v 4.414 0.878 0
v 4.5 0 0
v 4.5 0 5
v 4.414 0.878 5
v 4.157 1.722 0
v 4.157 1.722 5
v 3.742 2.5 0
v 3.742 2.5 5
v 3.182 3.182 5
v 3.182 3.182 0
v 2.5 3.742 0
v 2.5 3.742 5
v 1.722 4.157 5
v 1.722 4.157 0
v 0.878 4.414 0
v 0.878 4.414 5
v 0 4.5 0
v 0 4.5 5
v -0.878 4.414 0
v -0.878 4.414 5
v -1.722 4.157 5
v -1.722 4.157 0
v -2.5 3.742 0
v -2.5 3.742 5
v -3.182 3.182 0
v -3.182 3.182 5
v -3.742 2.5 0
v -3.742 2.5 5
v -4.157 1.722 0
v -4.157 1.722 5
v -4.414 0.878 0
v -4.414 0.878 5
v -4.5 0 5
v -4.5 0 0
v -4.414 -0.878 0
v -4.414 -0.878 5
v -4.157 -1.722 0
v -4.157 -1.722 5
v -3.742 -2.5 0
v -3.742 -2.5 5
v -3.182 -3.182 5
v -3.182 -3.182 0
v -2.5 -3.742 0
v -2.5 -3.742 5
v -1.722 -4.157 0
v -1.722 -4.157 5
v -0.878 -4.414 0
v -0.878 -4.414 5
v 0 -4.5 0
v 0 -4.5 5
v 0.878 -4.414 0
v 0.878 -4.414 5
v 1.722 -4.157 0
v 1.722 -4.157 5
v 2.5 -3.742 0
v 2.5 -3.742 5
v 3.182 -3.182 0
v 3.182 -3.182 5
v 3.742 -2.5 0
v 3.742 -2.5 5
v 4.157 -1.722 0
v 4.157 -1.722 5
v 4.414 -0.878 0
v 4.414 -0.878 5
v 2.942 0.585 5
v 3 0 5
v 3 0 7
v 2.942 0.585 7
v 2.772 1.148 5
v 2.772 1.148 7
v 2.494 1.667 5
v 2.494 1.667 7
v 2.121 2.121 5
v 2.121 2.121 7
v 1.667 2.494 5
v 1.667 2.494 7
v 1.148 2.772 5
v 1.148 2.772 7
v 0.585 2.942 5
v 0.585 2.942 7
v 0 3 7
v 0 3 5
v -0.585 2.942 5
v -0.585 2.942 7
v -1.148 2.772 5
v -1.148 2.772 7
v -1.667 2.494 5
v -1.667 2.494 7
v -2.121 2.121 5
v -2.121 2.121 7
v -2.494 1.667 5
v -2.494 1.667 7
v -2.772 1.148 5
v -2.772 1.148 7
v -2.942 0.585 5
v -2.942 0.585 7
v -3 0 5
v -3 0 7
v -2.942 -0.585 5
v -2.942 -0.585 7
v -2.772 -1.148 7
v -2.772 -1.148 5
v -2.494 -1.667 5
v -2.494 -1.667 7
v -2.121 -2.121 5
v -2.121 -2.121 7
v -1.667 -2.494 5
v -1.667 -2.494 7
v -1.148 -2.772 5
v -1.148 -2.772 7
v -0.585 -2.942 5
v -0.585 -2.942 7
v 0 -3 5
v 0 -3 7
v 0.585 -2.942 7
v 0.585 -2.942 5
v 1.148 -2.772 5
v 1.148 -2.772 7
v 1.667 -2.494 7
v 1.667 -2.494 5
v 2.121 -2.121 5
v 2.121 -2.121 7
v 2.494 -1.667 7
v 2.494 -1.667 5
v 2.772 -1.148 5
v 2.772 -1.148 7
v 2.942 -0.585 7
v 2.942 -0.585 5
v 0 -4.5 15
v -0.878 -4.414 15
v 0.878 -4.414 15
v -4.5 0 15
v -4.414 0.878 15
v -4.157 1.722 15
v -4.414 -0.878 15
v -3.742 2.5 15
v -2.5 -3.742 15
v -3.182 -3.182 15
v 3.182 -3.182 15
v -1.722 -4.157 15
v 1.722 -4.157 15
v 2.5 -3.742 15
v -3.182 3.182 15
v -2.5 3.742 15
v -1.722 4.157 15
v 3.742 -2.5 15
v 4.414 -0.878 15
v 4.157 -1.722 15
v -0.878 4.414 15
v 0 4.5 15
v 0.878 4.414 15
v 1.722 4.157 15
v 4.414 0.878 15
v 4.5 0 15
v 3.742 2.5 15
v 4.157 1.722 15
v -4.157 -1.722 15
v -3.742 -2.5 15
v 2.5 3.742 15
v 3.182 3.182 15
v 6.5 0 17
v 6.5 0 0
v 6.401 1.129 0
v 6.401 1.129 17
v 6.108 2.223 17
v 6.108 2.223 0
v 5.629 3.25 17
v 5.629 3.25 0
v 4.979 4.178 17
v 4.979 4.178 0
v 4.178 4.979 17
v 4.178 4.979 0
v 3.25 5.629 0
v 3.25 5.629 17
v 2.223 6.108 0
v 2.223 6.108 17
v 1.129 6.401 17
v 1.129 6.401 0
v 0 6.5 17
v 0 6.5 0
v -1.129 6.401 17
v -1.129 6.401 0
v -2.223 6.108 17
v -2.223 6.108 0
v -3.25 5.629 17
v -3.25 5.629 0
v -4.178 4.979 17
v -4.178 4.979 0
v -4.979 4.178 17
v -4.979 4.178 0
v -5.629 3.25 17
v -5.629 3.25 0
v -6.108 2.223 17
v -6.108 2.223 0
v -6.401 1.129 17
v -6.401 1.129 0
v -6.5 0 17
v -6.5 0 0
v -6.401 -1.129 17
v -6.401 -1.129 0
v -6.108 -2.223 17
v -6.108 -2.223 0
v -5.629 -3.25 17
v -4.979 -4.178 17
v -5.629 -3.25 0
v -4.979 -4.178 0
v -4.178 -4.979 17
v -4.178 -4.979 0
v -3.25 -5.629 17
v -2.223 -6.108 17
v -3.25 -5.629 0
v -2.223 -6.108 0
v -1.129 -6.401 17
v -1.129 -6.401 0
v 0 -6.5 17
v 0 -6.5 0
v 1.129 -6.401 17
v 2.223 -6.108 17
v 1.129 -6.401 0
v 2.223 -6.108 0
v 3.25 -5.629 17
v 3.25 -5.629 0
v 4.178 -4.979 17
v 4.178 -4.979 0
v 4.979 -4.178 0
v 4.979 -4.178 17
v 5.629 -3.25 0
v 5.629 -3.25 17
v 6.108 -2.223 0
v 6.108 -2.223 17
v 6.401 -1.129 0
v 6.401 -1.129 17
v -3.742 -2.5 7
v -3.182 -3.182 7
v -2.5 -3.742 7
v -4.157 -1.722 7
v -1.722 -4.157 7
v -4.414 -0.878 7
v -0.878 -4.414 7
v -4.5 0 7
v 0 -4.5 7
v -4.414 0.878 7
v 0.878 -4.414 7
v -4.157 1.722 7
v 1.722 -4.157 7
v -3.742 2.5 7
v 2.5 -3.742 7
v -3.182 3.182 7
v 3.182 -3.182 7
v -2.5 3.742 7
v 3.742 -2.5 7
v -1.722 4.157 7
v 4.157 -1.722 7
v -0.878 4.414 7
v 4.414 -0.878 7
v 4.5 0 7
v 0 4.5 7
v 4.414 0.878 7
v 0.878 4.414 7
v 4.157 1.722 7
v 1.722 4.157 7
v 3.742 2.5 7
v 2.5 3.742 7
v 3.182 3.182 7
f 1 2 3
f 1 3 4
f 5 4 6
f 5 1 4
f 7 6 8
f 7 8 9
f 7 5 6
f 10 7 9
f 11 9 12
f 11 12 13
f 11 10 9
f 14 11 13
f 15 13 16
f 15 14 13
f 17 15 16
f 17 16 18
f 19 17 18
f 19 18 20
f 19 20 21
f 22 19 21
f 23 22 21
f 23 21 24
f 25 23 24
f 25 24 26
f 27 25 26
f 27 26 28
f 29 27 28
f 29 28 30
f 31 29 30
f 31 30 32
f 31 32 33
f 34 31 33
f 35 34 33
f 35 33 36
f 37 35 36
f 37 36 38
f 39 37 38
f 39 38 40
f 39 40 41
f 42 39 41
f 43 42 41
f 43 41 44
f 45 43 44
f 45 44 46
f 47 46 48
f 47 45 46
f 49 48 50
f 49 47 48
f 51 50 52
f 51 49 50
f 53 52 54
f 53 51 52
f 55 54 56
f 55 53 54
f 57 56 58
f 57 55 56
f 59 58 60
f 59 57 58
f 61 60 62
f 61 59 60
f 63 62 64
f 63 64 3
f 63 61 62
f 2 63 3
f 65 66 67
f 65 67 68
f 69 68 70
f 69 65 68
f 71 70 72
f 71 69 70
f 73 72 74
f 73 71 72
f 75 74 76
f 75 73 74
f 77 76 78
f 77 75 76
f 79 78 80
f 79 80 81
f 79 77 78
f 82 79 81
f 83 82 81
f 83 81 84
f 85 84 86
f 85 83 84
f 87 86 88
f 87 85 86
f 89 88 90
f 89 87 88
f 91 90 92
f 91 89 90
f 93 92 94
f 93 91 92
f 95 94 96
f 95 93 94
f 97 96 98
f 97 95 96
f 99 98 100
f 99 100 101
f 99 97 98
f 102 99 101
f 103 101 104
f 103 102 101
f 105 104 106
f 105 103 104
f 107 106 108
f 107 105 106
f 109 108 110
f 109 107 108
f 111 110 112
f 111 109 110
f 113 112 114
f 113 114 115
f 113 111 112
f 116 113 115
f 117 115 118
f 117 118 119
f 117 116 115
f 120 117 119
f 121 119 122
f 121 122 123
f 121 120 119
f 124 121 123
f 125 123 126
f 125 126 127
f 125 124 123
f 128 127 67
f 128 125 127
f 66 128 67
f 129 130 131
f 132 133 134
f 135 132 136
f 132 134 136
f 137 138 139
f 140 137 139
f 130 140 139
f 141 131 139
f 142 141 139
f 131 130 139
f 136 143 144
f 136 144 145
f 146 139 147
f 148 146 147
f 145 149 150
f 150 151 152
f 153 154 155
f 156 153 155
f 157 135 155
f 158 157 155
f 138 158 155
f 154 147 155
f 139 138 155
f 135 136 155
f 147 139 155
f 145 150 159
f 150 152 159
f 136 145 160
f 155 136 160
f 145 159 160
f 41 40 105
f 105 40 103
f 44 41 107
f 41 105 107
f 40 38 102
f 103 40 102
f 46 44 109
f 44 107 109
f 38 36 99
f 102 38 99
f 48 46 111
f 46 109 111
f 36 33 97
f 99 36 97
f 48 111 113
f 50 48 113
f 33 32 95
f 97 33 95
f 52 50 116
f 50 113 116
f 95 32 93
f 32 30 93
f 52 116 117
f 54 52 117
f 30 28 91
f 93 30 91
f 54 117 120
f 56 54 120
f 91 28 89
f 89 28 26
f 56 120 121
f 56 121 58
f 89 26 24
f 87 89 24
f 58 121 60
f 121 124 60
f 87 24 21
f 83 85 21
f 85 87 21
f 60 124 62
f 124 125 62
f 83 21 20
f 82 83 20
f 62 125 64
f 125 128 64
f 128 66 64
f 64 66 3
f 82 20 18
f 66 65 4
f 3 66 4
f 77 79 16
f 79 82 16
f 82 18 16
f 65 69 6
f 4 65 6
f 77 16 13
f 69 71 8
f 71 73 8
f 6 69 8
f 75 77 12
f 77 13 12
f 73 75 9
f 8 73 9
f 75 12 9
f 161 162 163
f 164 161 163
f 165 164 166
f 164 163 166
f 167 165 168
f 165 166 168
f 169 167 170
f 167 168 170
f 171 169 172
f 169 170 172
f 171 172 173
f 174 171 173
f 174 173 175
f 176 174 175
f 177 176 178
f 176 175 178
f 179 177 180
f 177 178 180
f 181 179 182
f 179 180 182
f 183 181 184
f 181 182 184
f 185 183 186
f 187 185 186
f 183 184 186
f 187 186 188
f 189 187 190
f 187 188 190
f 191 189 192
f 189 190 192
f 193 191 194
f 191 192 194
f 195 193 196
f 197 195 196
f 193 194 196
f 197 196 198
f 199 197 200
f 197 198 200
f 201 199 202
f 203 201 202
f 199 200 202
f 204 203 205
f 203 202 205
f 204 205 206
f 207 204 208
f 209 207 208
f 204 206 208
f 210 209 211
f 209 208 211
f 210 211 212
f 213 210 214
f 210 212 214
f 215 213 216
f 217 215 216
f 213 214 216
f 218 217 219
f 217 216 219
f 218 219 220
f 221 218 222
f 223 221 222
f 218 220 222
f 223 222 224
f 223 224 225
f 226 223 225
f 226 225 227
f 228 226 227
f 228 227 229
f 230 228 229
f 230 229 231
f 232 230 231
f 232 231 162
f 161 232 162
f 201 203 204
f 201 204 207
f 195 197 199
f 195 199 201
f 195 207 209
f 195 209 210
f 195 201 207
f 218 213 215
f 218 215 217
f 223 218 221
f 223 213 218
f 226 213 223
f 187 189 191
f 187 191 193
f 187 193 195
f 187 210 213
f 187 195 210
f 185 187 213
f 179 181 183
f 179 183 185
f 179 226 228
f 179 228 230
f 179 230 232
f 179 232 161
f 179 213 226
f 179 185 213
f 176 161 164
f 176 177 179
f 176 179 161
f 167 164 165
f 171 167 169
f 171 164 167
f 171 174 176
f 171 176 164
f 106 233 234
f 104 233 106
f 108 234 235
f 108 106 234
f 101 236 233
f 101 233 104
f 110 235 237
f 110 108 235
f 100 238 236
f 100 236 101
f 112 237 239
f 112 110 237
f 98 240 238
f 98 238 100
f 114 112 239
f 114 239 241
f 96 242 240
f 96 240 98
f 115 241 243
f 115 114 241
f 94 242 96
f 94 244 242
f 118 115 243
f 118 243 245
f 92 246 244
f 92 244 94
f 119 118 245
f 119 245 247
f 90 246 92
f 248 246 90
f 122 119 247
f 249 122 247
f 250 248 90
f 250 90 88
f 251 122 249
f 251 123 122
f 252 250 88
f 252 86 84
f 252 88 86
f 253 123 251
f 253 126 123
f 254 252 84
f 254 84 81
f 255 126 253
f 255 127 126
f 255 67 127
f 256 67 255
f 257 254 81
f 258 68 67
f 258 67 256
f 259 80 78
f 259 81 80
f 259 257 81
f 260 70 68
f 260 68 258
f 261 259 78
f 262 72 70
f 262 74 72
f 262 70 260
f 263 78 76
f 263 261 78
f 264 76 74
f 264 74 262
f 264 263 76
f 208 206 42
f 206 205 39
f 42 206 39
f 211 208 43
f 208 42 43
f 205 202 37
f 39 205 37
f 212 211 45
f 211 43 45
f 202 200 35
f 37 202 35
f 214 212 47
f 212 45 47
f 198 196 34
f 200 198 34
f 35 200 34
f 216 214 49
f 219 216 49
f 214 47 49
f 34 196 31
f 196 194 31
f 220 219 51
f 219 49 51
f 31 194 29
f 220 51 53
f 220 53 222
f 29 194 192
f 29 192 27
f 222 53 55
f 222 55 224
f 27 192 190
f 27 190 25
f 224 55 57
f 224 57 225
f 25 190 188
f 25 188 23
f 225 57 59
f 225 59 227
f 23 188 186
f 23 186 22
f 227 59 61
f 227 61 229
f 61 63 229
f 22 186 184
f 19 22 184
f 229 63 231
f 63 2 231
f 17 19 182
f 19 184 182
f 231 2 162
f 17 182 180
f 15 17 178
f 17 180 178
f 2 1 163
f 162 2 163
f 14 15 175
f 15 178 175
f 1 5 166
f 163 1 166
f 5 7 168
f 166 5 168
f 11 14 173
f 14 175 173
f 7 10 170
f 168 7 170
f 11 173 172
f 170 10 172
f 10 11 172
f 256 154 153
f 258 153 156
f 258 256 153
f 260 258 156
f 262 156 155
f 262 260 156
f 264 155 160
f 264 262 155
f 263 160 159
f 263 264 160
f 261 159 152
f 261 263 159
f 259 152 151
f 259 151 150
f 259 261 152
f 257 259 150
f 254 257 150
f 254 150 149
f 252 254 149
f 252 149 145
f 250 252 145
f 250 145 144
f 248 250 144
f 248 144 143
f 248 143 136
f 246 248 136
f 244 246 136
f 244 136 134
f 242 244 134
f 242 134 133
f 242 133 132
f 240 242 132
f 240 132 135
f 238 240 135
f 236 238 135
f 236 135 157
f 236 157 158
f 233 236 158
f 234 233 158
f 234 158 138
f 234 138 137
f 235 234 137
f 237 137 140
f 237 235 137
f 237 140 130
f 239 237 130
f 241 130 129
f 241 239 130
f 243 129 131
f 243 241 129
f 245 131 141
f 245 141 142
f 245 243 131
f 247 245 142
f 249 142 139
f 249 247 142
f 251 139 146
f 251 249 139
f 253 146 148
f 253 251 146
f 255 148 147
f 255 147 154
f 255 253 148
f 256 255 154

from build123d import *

# Parameters (mm, degrees)
F0_R     = 6.5
F0_R_2   = 4.5
F1_DEPTH = 17
F2_START = 5
F0_R_3   = 3
F2_DEPTH = 2
F3_START = 15
F3_DEPTH = 2


with BuildPart() as f1:
    # F0 (on Top) → F1 (new body)
    with BuildSketch(Plane.XY):
        Circle(F0_R)
        Circle(F0_R_2, mode=Mode.SUBTRACT)
    extrude(amount=F1_DEPTH)

    # F0 (on Top) → F2 (join)
    with BuildSketch(Plane.XY.offset(F2_START)):
        Circle(F0_R_2)
        Circle(F0_R_3, mode=Mode.SUBTRACT)
    extrude(amount=F2_DEPTH)

    # F0 (on Top) → F3 (join)
    with BuildSketch(Plane.XY.offset(F3_START)):
        Circle(F0_R_2)
        Circle(F0_R_3, mode=Mode.SUBTRACT)
        Circle(F0_R_3)
    extrude(amount=F3_DEPTH)


solid = f1.part
